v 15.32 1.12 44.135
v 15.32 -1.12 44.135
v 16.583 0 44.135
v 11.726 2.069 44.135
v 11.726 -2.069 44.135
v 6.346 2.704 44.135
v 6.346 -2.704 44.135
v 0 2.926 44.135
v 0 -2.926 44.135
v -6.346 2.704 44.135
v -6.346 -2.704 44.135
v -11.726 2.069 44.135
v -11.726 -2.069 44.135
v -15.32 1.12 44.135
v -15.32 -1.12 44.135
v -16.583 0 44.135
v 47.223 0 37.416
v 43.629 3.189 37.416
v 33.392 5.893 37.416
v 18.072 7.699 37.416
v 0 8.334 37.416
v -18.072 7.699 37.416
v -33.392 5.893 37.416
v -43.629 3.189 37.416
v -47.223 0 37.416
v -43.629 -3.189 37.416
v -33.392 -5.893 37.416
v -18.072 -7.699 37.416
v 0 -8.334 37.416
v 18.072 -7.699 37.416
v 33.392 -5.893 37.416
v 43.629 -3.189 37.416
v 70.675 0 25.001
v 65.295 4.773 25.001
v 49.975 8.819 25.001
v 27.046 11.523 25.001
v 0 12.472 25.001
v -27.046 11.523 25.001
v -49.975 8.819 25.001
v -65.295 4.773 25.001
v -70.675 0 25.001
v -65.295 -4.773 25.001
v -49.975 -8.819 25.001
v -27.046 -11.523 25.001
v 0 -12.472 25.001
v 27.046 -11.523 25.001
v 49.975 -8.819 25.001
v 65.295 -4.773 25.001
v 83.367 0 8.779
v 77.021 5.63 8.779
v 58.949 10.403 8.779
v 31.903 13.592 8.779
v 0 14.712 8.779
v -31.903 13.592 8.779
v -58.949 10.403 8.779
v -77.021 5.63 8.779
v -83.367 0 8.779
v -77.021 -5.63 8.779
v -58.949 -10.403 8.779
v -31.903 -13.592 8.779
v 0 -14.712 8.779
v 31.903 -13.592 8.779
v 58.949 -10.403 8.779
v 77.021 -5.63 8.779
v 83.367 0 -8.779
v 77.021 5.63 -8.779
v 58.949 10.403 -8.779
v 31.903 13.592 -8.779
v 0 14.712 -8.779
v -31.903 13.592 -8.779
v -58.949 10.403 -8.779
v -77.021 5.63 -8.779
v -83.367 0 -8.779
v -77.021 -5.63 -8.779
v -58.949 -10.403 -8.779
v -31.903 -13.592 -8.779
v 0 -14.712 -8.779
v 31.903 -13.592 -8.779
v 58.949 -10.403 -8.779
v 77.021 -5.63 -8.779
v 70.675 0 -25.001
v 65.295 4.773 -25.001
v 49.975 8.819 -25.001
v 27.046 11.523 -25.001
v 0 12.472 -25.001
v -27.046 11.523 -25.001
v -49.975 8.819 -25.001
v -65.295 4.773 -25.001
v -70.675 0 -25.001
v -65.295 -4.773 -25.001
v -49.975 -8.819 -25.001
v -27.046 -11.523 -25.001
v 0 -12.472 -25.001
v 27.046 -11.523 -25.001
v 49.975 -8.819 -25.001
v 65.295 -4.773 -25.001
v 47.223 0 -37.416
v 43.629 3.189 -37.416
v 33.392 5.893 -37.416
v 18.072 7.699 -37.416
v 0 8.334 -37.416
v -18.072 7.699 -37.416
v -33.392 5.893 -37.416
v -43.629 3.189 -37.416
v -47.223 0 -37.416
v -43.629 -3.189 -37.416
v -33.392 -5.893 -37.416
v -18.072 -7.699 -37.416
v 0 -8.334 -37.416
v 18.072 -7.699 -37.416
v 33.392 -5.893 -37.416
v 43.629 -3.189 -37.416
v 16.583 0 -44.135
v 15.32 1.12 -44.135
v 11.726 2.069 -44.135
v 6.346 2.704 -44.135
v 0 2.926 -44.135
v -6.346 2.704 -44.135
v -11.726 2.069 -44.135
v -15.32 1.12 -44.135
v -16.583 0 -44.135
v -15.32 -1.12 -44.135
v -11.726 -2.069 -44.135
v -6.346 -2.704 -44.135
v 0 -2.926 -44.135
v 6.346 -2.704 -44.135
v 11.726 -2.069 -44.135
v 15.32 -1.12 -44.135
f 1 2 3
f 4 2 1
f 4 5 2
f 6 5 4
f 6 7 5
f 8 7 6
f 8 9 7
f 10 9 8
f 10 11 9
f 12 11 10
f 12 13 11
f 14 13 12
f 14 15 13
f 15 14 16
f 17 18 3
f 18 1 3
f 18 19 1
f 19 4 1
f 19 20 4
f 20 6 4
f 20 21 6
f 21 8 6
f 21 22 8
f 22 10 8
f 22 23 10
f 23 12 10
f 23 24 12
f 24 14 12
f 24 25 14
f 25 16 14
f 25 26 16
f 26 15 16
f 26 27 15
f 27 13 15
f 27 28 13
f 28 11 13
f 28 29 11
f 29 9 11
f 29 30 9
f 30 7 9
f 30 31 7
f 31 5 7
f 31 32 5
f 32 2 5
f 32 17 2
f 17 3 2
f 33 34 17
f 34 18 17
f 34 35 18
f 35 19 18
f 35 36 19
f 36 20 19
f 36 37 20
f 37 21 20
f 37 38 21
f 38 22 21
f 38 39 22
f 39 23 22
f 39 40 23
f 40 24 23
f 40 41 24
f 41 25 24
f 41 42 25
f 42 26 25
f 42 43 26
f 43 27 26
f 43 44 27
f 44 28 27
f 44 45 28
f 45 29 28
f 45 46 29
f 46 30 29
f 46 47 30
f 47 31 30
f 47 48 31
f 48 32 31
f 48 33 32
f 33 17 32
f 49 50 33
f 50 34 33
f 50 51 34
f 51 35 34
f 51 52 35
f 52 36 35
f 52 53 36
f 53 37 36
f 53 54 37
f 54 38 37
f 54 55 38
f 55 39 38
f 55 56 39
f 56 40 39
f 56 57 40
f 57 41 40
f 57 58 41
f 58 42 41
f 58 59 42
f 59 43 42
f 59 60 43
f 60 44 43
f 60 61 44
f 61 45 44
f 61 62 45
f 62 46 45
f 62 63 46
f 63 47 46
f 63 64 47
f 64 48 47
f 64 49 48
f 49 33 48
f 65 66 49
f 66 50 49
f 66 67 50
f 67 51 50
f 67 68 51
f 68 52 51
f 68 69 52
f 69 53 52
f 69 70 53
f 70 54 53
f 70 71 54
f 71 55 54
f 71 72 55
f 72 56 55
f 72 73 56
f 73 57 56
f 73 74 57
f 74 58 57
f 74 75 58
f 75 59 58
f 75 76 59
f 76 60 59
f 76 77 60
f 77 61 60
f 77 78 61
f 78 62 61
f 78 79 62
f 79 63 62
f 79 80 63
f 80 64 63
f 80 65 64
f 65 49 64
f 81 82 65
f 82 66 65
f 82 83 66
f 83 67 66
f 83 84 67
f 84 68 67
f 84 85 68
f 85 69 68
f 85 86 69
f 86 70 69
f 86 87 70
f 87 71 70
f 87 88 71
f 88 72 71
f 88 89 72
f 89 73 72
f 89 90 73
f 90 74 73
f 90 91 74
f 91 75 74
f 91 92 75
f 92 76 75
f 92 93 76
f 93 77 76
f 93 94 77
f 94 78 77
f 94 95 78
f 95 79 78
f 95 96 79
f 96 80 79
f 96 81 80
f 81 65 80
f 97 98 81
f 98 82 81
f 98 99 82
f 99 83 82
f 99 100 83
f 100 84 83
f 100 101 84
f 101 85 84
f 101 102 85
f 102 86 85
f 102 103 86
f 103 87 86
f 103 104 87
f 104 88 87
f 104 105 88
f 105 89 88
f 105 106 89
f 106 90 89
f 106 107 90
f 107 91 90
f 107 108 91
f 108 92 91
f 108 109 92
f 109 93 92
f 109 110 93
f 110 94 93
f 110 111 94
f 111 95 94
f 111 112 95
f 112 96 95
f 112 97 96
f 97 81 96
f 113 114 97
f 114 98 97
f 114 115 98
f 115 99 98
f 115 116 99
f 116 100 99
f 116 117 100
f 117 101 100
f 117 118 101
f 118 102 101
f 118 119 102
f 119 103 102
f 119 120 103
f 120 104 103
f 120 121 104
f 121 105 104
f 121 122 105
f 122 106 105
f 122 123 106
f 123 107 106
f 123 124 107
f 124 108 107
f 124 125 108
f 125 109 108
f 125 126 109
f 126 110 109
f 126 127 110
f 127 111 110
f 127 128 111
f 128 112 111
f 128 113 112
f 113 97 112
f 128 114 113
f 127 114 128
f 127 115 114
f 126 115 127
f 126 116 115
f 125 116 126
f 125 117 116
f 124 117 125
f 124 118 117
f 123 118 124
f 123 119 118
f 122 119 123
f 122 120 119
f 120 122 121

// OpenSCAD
// Generated by SolidPython 1.0.1 on 2020-07-29 00:46:52


scale(v = [17, 3, 9]) {
	sphere(r = 5);
}
/***********************************************
*********      SolidPython code:      **********
************************************************
 
# import packages: SolidPython
from solid import *
from solid.utils import *
from itertools import chain, combinations, permutations


class Resize:

    def __init__(self, scad_file):
        self.scad_file = scad_file
        #self.scad_file = import_scad(scad_file)
        # cone/cylinder param:
        self.r1 = 0
        self.r2 = 0
        self.h = 0
        # rectangular prism param:
        self.w = 0
        self.l = 0
        # ellipse param:
        self.r = 0

    # import OpenScad code (file name corresponds to shape)


    # classify shape + parameters
    def assign(self, param1, param2, param3):
        if self.scad_file == 'cone.scad':
            self.r1 = param1
            self.r2 = param2
            self.h = param3
        elif self.scad_file == 'cylinder.scad':
            self.r1 = param1
            self.r2 = param2
            self.h = param3
        elif self.scad_file == 'rectangularPrism.scad':
            self.h = param1
            self.l = param2
            self.w = param3
        else:
            self.r = param1
            self.h = param2

    # resize parameters
    def iterate(self):
        x = range(3, 20, 2)
        i = 1
        if self.scad_file == 'cone.scad':
            tempList = list(permutations(x, 2))
            for temp in tempList:
                param1 = temp[0]
                param2 = temp[1]
                filepath = 'produced_scad_files/' + 'cone' + str(param1) + '_' + str(param2) + '_' + '.scad'
                scad_render_to_file(cylinder(h=param1, r1=param2, r2=0), filepath)

        elif self.scad_file == 'cylinder.scad':
            tempList = list(permutations(x, 3))
            for temp in tempList:
                param1 = temp[0]
                param2 = temp[1]
                filepath = 'produced_scad_files/' + 'cylinder' + str(param1) + '_' + str(param2) + '_' + '.scad'
                scad_render_to_file(cylinder(h=param1, r1=param2, r2=param2), filepath)

        elif self.scad_file == 'rectangularPrism.scad':
            tempList = list(permutations(x, 3))
            for temp in tempList:
                param1 = temp[0]
                param2 = temp[1]
                param3 = temp[2]
                filepath = 'produced_scad_files/' + 'rectangularPrism' + str(param1) + '_' + str(param2) + '_' + str(
                    param3) + '.scad'
                scad_render_to_file(cube(size=(param1, param2, param3)), filepath)

        elif self.scad_file == 'ellipse.scad':
            tempList = list(permutations(x, 4))
            for temp in tempList:
                param1 = temp[0]
                param2 = temp[1]
                param3 = temp[2]
                param4 = temp[3]
                filepath = 'produced_scad_files/' + 'ellipse' + str(param1) + '_' + str(param2) + '_' + str(param3) + '_' + str(param4) + '.scad'
                scad_render_to_file(scale([param1, param2, param3])(sphere(r=param4)), filepath)

    def render_to_scadfile(self):
        scad_render_to_file(scad, 'example.scad') 
 
************************************************/
